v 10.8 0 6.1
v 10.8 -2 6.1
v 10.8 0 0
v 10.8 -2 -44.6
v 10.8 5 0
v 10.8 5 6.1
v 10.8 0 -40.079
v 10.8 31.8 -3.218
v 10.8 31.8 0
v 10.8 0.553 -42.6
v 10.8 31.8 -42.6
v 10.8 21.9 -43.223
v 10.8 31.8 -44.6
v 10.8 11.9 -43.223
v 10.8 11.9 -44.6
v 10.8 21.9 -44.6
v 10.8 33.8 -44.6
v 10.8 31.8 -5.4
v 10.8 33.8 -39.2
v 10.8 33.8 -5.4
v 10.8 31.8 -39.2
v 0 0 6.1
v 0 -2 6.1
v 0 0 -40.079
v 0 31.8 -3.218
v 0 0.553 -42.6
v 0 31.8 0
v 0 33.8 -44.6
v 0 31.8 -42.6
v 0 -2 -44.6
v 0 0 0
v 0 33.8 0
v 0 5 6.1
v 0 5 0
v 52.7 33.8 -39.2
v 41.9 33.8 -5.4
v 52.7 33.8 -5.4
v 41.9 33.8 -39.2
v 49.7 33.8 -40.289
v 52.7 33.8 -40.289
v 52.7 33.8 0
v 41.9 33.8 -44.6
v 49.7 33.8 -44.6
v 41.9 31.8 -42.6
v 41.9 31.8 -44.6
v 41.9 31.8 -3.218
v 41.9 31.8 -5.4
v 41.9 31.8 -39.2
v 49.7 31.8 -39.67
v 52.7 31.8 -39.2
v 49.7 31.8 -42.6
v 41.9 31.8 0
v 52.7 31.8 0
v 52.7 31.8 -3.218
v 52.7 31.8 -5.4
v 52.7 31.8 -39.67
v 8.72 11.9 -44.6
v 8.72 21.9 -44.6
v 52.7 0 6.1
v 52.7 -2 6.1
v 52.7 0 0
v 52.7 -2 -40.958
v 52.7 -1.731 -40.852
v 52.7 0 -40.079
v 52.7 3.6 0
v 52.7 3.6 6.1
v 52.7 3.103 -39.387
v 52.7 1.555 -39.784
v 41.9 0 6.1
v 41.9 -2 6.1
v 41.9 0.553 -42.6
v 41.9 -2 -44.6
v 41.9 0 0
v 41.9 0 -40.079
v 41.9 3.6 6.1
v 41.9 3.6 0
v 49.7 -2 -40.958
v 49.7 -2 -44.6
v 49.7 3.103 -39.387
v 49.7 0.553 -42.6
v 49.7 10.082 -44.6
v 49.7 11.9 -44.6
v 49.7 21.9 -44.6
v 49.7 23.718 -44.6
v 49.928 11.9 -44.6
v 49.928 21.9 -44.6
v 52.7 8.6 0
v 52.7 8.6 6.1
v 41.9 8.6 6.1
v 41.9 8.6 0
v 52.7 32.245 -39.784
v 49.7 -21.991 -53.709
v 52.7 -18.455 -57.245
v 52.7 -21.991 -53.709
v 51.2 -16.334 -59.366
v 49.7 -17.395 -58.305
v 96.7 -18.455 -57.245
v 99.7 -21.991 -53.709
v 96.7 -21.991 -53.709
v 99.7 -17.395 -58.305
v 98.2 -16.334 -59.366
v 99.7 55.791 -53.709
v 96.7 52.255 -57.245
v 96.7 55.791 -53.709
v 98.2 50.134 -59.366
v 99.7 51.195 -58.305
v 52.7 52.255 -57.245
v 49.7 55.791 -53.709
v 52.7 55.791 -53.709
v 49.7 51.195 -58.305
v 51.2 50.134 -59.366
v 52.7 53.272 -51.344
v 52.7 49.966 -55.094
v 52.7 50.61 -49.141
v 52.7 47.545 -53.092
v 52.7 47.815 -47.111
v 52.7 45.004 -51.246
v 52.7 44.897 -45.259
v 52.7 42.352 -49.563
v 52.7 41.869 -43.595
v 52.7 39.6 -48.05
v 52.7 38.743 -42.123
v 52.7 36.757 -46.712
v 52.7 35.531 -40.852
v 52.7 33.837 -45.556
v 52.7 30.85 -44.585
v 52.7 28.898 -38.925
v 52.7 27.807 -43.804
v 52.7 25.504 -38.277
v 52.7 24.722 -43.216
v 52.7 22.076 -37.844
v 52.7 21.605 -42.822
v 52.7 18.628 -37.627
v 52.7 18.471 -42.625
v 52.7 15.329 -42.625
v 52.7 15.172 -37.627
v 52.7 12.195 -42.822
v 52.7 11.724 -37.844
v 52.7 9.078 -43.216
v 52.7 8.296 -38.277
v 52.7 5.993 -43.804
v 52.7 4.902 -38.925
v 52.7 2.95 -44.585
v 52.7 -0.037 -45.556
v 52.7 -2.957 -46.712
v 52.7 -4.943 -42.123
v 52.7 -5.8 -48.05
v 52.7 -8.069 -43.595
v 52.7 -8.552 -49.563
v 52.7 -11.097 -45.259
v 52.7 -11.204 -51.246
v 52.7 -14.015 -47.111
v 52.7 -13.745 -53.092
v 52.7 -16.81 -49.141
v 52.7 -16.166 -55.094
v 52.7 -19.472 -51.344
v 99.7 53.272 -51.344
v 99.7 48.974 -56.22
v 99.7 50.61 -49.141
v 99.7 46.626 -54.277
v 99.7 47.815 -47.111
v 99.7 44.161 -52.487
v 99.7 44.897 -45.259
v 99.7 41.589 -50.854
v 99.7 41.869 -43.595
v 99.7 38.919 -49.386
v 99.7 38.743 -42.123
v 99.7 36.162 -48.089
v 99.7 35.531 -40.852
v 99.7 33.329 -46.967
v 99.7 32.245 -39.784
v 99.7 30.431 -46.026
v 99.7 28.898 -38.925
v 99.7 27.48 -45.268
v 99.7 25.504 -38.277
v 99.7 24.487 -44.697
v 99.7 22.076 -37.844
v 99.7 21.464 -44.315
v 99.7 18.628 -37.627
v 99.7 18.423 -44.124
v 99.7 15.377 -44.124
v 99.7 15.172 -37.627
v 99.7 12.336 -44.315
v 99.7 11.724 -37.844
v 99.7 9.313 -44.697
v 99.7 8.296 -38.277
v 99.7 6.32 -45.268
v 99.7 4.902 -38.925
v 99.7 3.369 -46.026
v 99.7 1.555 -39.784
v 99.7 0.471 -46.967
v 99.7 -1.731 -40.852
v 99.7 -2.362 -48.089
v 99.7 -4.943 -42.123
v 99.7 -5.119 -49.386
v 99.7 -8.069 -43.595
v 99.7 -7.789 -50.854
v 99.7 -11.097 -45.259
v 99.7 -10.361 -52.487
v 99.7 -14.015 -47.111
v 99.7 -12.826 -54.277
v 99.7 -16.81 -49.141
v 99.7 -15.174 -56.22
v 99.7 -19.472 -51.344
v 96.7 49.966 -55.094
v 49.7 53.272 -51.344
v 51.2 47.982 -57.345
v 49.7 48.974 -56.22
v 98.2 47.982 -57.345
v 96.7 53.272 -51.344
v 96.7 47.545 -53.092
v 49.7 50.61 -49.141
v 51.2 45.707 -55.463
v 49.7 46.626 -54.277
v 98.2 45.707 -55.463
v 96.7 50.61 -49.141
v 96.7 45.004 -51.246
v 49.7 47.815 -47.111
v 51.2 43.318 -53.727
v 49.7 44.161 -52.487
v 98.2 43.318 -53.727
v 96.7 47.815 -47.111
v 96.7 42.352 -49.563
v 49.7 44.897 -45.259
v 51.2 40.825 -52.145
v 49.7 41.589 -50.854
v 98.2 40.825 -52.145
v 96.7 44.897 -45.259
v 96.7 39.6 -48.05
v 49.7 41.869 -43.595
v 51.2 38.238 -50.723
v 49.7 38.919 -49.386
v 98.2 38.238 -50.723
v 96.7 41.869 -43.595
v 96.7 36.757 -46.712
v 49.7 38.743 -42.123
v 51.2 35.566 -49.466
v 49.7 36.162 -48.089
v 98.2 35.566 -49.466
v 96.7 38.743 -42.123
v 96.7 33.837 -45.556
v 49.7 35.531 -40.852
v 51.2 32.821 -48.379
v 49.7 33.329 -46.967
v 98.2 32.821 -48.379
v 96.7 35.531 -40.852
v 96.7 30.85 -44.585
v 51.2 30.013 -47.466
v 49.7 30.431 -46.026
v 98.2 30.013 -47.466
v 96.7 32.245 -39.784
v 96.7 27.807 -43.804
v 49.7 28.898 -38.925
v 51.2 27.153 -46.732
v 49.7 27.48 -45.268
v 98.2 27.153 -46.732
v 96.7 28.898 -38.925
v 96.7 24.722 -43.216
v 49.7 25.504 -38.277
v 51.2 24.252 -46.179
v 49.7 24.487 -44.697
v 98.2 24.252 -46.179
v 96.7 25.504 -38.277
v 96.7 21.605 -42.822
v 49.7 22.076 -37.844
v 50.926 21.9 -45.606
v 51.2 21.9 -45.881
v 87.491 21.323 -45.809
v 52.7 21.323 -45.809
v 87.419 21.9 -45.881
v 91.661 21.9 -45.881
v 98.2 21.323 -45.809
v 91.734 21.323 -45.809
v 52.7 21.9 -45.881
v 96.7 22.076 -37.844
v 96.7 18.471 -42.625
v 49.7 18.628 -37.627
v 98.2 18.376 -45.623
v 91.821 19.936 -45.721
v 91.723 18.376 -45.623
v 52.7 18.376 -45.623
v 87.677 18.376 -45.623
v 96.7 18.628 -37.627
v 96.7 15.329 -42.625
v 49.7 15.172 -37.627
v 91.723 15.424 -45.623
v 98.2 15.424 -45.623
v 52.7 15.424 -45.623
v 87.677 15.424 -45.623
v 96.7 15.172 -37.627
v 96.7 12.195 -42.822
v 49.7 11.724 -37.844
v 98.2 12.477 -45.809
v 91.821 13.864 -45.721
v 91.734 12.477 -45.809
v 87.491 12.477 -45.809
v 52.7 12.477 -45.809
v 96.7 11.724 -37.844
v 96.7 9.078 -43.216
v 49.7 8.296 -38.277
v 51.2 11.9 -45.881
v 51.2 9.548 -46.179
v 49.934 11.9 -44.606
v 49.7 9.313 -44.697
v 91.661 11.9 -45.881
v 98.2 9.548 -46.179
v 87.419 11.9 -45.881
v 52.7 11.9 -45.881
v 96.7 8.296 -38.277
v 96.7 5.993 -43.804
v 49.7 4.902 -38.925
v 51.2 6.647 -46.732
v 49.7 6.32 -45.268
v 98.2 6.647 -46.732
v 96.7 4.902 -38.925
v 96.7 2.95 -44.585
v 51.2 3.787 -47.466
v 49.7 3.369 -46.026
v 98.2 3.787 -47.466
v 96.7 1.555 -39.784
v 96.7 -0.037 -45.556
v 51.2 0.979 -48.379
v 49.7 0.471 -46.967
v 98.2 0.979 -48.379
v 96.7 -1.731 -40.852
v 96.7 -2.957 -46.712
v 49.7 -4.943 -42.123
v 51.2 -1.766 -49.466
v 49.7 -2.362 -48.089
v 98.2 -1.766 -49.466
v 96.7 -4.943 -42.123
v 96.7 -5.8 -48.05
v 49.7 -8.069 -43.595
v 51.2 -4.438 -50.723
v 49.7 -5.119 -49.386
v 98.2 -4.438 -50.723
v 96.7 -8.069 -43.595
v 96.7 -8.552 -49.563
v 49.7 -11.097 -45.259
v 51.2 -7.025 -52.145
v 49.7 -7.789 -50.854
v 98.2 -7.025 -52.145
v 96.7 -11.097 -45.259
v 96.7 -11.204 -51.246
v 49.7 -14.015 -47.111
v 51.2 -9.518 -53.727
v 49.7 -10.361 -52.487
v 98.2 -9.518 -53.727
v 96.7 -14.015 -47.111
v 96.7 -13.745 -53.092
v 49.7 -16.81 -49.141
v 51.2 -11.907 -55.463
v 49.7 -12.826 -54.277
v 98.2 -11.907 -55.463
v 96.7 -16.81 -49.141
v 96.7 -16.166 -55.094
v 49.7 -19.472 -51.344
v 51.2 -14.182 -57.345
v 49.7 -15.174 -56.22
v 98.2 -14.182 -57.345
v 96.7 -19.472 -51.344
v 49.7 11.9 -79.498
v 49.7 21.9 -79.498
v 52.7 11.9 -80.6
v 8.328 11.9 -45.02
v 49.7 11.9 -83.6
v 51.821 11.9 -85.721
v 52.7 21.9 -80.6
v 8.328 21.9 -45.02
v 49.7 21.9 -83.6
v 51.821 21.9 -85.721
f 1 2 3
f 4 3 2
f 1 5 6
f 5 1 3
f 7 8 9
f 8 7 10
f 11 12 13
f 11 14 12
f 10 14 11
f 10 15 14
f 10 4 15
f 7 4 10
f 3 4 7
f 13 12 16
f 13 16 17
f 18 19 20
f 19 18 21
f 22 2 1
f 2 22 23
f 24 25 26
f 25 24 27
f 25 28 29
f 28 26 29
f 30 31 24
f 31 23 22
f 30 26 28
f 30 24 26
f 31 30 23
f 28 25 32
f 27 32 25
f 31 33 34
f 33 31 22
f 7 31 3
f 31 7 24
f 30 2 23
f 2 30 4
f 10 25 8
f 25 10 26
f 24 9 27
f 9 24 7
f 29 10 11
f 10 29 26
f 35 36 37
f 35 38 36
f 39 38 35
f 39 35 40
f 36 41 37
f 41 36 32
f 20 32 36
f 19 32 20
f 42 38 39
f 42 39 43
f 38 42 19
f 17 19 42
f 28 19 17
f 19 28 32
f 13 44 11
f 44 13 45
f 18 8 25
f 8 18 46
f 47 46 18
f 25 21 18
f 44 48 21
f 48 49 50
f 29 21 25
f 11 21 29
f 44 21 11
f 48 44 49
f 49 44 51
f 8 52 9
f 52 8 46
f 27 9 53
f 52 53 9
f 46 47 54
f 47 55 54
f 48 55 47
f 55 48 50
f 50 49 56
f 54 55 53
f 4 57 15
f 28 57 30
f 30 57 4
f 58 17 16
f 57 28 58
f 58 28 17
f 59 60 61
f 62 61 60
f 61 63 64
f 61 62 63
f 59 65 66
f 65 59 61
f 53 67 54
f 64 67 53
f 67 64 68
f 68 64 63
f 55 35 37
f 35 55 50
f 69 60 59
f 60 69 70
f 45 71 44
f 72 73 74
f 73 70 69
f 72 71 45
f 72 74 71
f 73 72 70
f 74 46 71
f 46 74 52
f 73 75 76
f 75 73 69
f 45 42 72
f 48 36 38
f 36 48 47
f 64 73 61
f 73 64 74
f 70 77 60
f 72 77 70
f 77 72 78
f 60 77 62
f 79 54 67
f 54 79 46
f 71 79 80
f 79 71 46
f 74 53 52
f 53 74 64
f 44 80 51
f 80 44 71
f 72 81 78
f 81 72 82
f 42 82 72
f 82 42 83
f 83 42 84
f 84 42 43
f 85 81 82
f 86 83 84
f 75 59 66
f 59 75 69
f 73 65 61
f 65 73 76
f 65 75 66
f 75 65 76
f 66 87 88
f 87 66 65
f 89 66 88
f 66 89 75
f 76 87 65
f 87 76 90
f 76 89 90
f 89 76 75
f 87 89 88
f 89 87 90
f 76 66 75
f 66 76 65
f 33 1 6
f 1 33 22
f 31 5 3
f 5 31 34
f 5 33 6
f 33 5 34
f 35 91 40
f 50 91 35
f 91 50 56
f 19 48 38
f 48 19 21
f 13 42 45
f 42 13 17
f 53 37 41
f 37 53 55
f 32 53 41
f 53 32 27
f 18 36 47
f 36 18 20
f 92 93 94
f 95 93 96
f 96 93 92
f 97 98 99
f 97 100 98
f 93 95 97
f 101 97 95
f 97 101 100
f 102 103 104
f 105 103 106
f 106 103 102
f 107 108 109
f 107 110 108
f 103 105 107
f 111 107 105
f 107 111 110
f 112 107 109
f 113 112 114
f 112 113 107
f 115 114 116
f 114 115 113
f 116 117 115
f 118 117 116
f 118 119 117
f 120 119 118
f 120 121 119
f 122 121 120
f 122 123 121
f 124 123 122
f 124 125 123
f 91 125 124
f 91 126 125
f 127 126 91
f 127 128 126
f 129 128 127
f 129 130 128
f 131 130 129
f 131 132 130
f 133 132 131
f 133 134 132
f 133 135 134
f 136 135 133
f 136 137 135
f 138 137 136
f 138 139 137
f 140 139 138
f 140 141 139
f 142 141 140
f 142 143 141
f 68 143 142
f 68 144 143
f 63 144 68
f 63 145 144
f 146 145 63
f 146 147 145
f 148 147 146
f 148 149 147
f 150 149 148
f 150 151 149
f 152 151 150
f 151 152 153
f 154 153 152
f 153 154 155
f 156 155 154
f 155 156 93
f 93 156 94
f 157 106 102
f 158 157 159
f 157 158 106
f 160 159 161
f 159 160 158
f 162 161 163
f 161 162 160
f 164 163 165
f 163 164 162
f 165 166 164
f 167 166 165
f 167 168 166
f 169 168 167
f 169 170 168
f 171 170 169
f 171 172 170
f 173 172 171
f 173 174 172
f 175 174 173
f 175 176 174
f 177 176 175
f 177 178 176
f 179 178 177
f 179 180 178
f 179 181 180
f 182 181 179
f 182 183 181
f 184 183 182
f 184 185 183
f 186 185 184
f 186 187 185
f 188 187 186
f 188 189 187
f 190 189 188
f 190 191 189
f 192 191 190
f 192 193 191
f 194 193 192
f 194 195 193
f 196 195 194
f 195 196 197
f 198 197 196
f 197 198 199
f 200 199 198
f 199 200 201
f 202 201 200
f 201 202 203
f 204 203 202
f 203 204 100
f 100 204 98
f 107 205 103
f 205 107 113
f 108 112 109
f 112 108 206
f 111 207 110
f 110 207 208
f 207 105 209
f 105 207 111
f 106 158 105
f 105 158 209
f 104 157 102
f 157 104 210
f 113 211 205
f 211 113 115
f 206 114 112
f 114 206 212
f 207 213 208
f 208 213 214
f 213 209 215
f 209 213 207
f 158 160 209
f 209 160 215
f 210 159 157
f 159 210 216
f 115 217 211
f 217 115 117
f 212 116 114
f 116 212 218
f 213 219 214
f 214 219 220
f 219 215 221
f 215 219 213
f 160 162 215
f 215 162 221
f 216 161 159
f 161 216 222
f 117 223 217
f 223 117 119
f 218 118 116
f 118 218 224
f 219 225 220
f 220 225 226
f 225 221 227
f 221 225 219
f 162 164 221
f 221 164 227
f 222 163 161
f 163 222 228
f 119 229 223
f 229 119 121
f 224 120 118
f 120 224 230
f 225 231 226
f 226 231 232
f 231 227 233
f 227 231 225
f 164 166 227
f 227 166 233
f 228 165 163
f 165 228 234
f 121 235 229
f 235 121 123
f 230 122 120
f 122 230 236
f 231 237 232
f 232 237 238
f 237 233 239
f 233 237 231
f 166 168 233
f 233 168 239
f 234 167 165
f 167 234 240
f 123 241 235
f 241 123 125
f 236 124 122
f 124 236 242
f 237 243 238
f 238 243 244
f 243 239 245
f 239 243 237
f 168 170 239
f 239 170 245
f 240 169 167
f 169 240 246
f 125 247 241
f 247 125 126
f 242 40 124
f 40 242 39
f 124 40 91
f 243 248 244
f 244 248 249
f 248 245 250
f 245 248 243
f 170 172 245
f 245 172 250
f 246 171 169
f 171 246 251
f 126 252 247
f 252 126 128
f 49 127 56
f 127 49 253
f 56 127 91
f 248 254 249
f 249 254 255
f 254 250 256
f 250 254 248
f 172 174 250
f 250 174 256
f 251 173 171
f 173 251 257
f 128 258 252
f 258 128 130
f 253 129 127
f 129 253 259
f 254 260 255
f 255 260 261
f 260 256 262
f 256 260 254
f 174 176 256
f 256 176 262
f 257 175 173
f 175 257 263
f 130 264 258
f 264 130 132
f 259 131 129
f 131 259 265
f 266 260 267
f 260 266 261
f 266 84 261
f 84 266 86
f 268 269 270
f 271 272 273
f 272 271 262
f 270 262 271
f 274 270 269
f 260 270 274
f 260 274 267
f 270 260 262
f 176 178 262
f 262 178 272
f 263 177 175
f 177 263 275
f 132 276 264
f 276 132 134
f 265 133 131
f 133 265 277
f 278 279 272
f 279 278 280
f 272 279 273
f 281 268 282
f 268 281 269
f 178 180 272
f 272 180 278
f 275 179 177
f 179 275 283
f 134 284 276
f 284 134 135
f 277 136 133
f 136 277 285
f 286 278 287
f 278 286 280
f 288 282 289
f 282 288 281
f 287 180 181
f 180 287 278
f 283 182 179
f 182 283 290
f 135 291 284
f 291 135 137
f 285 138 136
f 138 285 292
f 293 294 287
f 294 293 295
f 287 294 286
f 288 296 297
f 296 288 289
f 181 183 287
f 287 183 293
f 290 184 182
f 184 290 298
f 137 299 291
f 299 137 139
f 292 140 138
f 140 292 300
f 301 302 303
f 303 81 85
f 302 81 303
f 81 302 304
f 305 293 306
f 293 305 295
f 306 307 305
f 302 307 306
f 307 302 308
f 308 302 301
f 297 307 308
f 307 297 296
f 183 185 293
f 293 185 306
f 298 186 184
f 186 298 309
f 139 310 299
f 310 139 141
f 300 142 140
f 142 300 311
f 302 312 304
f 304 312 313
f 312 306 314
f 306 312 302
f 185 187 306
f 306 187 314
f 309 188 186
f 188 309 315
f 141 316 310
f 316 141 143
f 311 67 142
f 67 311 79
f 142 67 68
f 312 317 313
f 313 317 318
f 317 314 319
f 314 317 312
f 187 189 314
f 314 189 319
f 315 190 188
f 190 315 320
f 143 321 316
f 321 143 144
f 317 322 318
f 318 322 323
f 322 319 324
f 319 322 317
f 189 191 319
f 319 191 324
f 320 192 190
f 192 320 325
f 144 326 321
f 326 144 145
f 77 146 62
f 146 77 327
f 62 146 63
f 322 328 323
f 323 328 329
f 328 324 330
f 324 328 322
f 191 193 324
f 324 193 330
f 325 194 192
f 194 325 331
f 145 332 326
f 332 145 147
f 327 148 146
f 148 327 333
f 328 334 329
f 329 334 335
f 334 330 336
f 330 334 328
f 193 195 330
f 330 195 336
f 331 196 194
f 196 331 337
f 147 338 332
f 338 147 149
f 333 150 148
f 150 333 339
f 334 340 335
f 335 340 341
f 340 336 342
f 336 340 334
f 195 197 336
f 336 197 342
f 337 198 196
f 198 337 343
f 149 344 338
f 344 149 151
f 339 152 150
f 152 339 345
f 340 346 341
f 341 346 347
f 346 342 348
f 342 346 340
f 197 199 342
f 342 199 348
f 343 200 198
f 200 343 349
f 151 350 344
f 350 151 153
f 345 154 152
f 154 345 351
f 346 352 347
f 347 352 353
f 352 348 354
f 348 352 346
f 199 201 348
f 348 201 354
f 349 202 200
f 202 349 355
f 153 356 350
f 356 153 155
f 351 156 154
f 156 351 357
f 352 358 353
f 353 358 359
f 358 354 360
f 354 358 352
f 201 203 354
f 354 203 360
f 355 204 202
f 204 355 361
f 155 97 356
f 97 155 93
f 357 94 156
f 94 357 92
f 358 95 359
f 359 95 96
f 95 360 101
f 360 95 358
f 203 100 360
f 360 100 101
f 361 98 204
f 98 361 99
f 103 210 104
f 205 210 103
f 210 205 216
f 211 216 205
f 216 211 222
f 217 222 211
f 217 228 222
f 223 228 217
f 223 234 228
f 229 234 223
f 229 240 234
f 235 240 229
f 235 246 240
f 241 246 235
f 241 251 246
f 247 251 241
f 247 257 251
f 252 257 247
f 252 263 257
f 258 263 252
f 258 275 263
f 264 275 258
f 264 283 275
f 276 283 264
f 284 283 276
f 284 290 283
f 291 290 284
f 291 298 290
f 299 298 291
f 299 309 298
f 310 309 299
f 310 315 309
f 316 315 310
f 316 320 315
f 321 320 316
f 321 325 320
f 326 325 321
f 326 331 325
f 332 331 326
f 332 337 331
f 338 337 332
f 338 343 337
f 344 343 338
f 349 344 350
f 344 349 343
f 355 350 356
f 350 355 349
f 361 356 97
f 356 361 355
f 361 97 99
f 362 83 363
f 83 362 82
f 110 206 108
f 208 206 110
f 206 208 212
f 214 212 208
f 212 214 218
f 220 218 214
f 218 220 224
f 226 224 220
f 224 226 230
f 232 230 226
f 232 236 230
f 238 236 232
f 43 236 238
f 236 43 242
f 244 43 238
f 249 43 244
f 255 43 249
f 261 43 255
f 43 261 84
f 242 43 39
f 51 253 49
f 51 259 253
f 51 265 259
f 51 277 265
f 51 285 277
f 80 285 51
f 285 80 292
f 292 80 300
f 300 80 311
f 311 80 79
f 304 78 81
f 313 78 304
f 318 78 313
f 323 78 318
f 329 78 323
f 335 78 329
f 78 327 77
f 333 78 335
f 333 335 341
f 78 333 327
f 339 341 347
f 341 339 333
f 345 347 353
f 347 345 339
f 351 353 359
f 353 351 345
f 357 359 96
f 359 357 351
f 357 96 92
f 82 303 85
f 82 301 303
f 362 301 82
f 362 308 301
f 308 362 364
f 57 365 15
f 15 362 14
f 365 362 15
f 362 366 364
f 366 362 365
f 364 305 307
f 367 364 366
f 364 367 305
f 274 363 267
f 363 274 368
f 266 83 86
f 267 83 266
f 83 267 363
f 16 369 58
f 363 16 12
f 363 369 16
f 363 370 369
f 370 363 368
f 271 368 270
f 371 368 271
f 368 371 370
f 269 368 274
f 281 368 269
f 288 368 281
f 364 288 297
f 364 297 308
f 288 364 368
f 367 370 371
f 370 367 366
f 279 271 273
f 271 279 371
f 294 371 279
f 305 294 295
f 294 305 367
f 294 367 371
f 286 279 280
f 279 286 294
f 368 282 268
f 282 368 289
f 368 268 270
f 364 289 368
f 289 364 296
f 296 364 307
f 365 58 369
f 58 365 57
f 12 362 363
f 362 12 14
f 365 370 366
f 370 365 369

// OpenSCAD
binding_w = 10.8;
binding_h = 6.1;
binding_l = 5;

binding_x_pad = 31.1;
binding_y_pad = 3.6;
binding_z_pad = 0;

binding_thickness = 2;

binding_backplate_height = 42.6;
binding_top_length = 33.8;
binding_arch_length = sqrt(binding_backplate_height * binding_backplate_height + binding_top_length * binding_top_length);
binding_arch_angle = - acos(binding_backplate_height / binding_arch_length);

module desk_binding() {
	module arch() {
		translate([0, 0, -binding_backplate_height-binding_h]) {
			// Back
			cube([binding_w, binding_thickness, binding_backplate_height + binding_h]);

			// Arch
			rotate([binding_arch_angle, 0, 0])
				cube([binding_w, binding_thickness, binding_arch_length]);

			// Front
			translate([0, binding_top_length, 0]) {
				cube([binding_w, binding_thickness, binding_backplate_height]);
			}

			// Bottom
			translate([0, 0, -binding_thickness])
				cube([binding_w, binding_top_length + binding_thickness, binding_thickness]);
		}
	}

	// Left
	translate([binding_x_pad + binding_w, binding_y_pad, binding_z_pad]) {
		cube([binding_w, binding_l, binding_h]);
		translate([0, -binding_y_pad, 0]) {
			cube([binding_w, binding_y_pad, binding_h]);
			
			translate([0, -binding_thickness, binding_h])
				arch();
		}
	}

	// Right
	cube([binding_w, binding_l, binding_h]);
	translate([0, -binding_thickness, binding_h])
		arch();

	// Front
	translate([0, binding_top_length - binding_thickness, -binding_backplate_height-binding_thickness])
		cube([binding_w * 2 + binding_x_pad, binding_thickness, binding_w/2]);
	translate([0, binding_top_length - binding_thickness, -binding_w/2])
		cube([binding_w * 2 + binding_x_pad, binding_thickness, binding_w/2]);
}

holder_width = 50;
holder_r = 50;
holder_block_thickness = 5;
holder_thickness = 3;
holder_angle = 90; 
holder_binding_thickness = 3;
holder_binding_thckness_w = 10;
holder_binding_height = 40;

module holder() {
	module pie_slice(radius, angle, step) {
for(theta = [0:step:angle-step]) {
rotate([0,0,0]) linear_extrude(height = radius*2, center=true)
polygon( points = [[0,0],[radius * cos(theta+step) ,radius * sin(theta+step)],[radius*cos(theta),radius*sin(theta)]]);
}}

module partial_rotate_extrude(angle, radius, axial_range, convex) {
intersection () {
rotate_extrude(convexity=convex) translate([radius,0,0]) child(0);
pie_slice(radius + axial_range, angle, angle/10);
}} 


	translate([0, holder_width/2, 0])
	rotate([90, -holder_angle/2, 0])
	partial_rotate_extrude(angle = holder_angle, radius = holder_r-holder_thickness, axial_range = 255, convex = 10) {
		polygon([
			[holder_thickness/2, holder_width],
			[holder_thickness+holder_block_thickness, holder_width],
			[holder_thickness+holder_block_thickness, holder_width-holder_thickness],		
			[holder_thickness, holder_width-holder_thickness],
			[holder_thickness, holder_thickness],
			[holder_thickness+holder_block_thickness, holder_thickness],
			[holder_thickness+holder_block_thickness, 0],
			[holder_thickness/2, 0],
			[0, holder_thickness/2],
			[0, holder_width - holder_thickness/2],
		]);
	}

	translate([-holder_binding_thckness_w/2, -holder_width/2, holder_r-holder_binding_height-1]) {
		cube([holder_binding_thckness_w, holder_binding_thickness, holder_binding_height]);
		rotate([-45, 0, 0])
			cube([holder_binding_thckness_w, holder_binding_thickness, holder_binding_height * sqrt(2)]);
		rotate([47, 0, 0])
			cube([holder_binding_thckness_w, holder_binding_thickness, holder_binding_height * sqrt(2)]);
	}
}


$fn=100;

desk_binding();
translate([binding_x_pad+binding_w*2+holder_width/2-holder_thickness, binding_top_length/2, -holder_r-binding_backplate_height]) {
	rotate([0, 0, -90]) holder();
}
